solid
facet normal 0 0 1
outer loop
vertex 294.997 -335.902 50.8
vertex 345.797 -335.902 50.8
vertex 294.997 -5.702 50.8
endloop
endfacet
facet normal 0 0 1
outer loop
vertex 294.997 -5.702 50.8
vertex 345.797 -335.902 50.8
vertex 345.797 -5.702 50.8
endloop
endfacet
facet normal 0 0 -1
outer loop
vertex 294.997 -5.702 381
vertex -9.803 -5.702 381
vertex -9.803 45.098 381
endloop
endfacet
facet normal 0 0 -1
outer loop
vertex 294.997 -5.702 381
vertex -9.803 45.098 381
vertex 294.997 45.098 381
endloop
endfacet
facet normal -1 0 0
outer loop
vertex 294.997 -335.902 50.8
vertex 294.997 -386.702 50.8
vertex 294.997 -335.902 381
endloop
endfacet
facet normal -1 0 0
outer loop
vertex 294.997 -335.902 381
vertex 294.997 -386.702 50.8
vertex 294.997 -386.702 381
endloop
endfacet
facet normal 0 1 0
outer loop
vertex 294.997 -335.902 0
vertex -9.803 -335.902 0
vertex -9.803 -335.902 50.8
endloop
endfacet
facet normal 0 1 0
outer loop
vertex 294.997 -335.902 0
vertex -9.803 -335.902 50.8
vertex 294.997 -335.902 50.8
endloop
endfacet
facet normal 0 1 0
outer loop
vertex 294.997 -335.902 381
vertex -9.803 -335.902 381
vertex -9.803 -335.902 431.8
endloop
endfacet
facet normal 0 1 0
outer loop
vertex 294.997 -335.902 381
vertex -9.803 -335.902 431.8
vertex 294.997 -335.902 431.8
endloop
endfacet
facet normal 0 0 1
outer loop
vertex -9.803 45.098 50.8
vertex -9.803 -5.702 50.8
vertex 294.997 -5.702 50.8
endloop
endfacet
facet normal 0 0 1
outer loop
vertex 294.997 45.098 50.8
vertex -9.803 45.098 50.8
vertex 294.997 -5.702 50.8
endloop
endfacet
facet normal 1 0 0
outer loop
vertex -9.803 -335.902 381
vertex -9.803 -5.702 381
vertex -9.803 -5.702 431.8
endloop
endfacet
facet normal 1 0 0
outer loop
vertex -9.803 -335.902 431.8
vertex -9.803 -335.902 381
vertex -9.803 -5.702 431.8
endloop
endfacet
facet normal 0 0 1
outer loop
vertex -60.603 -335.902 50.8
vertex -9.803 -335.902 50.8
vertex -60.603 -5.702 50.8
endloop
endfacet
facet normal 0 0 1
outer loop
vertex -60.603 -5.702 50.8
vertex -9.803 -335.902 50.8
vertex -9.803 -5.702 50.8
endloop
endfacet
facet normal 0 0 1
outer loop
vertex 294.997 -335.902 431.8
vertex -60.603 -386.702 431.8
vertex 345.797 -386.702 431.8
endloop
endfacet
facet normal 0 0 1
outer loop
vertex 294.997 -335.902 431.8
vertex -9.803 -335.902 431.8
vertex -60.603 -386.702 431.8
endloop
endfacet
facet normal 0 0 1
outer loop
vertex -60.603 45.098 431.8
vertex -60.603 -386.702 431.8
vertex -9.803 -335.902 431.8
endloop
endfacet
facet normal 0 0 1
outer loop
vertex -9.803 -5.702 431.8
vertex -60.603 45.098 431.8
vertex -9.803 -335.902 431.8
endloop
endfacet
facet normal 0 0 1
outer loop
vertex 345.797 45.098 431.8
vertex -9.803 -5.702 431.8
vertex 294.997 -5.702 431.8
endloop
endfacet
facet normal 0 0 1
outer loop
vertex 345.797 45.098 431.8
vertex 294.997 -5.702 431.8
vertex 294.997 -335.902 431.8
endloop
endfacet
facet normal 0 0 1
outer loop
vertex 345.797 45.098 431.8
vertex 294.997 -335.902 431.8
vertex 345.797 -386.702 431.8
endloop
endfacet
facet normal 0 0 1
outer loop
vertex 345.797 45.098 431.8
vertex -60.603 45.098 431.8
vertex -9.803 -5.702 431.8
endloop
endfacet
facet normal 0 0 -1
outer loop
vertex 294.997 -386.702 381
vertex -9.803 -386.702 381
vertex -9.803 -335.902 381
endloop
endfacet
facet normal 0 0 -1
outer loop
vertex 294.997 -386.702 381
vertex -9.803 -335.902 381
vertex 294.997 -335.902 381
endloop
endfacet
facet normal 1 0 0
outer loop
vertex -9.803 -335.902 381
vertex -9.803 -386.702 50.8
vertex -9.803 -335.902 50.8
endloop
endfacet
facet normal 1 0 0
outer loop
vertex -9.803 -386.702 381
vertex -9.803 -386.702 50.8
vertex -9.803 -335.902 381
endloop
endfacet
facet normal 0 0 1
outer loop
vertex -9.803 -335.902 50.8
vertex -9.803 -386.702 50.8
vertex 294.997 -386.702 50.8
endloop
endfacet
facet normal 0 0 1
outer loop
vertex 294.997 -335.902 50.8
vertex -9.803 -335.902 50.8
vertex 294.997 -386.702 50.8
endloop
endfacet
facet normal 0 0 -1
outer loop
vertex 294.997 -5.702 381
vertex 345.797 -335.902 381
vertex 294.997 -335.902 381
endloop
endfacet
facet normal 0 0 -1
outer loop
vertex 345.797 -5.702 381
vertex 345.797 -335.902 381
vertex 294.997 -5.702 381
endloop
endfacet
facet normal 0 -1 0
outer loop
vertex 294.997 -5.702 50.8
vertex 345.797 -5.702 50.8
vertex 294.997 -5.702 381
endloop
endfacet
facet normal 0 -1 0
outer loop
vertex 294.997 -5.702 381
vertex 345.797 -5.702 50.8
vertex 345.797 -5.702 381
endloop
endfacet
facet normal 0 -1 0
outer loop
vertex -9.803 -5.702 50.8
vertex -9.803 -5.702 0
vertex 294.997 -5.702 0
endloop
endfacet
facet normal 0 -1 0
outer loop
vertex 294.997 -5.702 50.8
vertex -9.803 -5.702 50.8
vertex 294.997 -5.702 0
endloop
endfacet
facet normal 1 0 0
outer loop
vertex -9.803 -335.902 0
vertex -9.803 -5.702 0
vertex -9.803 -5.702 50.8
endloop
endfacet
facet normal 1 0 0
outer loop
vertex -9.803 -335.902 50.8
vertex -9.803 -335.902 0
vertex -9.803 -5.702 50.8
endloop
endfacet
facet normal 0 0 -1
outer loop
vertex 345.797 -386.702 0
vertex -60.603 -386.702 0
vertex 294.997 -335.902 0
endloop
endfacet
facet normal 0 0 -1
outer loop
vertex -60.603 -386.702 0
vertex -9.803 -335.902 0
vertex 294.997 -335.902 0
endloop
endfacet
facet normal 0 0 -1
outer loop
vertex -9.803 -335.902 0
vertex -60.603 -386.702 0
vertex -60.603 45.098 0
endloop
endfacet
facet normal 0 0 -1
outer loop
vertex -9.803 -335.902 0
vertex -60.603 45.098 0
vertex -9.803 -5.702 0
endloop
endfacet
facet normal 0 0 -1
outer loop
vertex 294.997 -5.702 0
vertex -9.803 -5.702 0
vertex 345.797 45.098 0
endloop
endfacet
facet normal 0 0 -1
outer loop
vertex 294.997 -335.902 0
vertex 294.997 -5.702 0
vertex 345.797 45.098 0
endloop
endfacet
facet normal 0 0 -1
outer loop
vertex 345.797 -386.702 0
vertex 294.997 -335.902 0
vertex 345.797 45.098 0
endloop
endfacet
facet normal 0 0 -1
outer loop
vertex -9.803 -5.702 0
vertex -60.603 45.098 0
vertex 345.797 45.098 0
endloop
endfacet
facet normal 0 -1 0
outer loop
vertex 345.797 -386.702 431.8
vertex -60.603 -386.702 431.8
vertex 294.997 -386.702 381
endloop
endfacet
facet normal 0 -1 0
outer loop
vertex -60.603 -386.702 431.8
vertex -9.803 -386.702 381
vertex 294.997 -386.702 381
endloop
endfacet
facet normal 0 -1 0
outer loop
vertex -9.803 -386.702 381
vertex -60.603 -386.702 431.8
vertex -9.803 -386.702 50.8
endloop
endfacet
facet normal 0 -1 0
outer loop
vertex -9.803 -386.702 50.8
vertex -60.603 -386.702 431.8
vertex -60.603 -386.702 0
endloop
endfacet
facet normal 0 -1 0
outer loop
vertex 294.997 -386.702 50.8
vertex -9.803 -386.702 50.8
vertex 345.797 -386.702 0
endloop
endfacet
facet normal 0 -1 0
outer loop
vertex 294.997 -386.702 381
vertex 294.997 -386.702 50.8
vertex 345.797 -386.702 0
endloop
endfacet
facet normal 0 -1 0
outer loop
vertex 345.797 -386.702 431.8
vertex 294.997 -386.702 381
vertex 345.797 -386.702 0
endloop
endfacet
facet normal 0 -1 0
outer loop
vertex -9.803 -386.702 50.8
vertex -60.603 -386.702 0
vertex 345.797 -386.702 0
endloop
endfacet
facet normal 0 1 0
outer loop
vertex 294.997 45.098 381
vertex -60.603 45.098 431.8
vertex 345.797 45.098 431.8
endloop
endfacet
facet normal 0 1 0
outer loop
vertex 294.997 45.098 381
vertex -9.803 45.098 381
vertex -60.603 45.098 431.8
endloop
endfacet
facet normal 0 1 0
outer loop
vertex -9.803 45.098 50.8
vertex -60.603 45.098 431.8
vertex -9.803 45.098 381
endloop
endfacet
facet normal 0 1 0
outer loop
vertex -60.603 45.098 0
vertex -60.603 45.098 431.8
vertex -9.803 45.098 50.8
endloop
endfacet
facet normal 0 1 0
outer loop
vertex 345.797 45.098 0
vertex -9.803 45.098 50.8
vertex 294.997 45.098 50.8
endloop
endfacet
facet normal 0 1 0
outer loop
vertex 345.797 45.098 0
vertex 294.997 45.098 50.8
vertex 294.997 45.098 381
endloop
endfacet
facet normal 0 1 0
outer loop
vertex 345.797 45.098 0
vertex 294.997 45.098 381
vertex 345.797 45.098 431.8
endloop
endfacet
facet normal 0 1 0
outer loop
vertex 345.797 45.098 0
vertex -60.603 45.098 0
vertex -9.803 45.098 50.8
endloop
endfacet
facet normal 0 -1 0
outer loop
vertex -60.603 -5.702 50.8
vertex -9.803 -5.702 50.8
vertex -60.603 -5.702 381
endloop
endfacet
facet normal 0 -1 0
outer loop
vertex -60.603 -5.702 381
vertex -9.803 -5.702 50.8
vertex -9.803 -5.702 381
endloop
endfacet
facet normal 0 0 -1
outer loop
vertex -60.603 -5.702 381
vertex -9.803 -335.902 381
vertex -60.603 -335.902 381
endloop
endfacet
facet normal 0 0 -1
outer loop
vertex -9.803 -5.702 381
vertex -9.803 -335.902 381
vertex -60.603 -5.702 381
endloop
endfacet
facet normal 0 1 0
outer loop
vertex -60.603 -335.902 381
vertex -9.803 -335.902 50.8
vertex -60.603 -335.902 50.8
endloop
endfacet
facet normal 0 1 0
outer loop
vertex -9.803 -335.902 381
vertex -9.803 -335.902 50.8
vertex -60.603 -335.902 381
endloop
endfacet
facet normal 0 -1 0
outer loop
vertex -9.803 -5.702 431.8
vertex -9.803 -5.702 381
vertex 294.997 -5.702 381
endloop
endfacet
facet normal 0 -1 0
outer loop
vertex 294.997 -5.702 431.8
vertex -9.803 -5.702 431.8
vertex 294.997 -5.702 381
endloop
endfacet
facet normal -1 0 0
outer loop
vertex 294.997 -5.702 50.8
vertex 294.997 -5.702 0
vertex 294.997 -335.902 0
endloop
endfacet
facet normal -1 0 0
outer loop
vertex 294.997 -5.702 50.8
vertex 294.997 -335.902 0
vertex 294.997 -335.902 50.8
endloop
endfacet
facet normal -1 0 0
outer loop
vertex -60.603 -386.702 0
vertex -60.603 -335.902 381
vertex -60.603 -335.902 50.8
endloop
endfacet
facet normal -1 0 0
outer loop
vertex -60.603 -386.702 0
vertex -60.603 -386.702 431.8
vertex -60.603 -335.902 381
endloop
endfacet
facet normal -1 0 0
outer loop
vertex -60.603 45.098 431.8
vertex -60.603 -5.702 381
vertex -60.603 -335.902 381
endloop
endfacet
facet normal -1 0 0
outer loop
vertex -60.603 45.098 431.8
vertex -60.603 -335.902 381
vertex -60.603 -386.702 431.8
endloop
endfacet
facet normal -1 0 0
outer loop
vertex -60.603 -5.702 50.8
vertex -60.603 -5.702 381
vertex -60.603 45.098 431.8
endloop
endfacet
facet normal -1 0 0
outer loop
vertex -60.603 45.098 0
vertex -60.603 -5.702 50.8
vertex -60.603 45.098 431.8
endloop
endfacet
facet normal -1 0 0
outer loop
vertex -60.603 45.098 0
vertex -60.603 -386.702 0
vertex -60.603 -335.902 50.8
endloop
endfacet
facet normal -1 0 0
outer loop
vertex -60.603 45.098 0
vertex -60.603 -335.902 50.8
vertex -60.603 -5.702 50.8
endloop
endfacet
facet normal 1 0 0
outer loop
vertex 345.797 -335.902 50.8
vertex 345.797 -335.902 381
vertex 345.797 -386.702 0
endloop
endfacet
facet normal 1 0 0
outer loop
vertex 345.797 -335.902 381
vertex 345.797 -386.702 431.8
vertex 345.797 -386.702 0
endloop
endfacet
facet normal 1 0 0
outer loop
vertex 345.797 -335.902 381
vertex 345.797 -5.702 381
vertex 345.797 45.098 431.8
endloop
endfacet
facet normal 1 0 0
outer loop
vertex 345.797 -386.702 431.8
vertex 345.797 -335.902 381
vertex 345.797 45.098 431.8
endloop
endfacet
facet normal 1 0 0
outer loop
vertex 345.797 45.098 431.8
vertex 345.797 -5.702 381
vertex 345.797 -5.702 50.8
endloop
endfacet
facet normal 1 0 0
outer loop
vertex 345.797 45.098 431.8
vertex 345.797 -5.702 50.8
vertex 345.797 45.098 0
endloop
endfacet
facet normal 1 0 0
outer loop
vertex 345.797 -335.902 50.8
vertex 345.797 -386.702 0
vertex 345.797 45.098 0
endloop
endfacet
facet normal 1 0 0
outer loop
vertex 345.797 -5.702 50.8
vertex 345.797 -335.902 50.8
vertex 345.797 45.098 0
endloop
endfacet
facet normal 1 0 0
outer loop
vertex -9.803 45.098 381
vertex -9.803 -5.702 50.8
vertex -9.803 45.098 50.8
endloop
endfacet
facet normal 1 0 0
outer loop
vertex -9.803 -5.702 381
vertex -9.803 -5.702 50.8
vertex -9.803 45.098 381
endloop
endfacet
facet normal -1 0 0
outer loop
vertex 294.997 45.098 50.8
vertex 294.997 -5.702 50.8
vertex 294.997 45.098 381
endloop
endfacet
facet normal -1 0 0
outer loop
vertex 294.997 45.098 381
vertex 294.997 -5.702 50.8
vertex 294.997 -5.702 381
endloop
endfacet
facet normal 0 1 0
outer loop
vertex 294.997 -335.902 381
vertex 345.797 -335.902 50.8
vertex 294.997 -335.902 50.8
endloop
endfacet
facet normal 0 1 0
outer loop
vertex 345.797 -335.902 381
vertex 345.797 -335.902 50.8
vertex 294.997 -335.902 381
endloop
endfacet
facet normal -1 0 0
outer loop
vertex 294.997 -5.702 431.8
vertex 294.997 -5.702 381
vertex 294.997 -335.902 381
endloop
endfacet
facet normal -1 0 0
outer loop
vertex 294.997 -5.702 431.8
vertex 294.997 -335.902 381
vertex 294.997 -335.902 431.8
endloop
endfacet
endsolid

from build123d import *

# Parameters (mm, degrees)
F0_W     = 406.4
F0_H     = 431.8
F1_DEPTH = 431.8
F2_W     = 304.8
F2_H     = 330.2
F3_DEPTH = 1270
F4_W     = 304.8
F4_H     = 330.2
F5_DEPTH = 754.38
F6_W     = 330.2
F6_H     = 330.2
F7_DEPTH = 1270


with BuildPart() as f1:
    # F0 (on Top) → F1 (new body)
    with BuildSketch(Plane.XY):
        with Locations((142.597137, -170.802241)):
            Rectangle(F0_W, F0_H)
    extrude(amount=F1_DEPTH)

    # F2 (on face) → F3 (cut)
    with BuildSketch(Plane.XZ.offset(386.702241)):
        with Locations((142.597137, 215.9)):
            Rectangle(F2_W, F2_H)
    extrude(amount=-F3_DEPTH, mode=Mode.SUBTRACT)

    # F4 (on face) → F5 (cut)
    with BuildSketch(Plane(origin=(0, 0, 0), x_dir=(1, 0, 0), z_dir=(0, 0, -1))):
        with Locations((142.597137, 170.802241)):
            Rectangle(F4_W, F4_H)
    extrude(amount=-F5_DEPTH, mode=Mode.SUBTRACT)

    # F6 (on face) → F7 (cut)
    with BuildSketch(Plane.YZ.offset(345.797137)):
        with Locations((-170.802241, 215.9)):
            Rectangle(F6_W, F6_H)
    extrude(amount=-F7_DEPTH, mode=Mode.SUBTRACT)


solid = f1.part
